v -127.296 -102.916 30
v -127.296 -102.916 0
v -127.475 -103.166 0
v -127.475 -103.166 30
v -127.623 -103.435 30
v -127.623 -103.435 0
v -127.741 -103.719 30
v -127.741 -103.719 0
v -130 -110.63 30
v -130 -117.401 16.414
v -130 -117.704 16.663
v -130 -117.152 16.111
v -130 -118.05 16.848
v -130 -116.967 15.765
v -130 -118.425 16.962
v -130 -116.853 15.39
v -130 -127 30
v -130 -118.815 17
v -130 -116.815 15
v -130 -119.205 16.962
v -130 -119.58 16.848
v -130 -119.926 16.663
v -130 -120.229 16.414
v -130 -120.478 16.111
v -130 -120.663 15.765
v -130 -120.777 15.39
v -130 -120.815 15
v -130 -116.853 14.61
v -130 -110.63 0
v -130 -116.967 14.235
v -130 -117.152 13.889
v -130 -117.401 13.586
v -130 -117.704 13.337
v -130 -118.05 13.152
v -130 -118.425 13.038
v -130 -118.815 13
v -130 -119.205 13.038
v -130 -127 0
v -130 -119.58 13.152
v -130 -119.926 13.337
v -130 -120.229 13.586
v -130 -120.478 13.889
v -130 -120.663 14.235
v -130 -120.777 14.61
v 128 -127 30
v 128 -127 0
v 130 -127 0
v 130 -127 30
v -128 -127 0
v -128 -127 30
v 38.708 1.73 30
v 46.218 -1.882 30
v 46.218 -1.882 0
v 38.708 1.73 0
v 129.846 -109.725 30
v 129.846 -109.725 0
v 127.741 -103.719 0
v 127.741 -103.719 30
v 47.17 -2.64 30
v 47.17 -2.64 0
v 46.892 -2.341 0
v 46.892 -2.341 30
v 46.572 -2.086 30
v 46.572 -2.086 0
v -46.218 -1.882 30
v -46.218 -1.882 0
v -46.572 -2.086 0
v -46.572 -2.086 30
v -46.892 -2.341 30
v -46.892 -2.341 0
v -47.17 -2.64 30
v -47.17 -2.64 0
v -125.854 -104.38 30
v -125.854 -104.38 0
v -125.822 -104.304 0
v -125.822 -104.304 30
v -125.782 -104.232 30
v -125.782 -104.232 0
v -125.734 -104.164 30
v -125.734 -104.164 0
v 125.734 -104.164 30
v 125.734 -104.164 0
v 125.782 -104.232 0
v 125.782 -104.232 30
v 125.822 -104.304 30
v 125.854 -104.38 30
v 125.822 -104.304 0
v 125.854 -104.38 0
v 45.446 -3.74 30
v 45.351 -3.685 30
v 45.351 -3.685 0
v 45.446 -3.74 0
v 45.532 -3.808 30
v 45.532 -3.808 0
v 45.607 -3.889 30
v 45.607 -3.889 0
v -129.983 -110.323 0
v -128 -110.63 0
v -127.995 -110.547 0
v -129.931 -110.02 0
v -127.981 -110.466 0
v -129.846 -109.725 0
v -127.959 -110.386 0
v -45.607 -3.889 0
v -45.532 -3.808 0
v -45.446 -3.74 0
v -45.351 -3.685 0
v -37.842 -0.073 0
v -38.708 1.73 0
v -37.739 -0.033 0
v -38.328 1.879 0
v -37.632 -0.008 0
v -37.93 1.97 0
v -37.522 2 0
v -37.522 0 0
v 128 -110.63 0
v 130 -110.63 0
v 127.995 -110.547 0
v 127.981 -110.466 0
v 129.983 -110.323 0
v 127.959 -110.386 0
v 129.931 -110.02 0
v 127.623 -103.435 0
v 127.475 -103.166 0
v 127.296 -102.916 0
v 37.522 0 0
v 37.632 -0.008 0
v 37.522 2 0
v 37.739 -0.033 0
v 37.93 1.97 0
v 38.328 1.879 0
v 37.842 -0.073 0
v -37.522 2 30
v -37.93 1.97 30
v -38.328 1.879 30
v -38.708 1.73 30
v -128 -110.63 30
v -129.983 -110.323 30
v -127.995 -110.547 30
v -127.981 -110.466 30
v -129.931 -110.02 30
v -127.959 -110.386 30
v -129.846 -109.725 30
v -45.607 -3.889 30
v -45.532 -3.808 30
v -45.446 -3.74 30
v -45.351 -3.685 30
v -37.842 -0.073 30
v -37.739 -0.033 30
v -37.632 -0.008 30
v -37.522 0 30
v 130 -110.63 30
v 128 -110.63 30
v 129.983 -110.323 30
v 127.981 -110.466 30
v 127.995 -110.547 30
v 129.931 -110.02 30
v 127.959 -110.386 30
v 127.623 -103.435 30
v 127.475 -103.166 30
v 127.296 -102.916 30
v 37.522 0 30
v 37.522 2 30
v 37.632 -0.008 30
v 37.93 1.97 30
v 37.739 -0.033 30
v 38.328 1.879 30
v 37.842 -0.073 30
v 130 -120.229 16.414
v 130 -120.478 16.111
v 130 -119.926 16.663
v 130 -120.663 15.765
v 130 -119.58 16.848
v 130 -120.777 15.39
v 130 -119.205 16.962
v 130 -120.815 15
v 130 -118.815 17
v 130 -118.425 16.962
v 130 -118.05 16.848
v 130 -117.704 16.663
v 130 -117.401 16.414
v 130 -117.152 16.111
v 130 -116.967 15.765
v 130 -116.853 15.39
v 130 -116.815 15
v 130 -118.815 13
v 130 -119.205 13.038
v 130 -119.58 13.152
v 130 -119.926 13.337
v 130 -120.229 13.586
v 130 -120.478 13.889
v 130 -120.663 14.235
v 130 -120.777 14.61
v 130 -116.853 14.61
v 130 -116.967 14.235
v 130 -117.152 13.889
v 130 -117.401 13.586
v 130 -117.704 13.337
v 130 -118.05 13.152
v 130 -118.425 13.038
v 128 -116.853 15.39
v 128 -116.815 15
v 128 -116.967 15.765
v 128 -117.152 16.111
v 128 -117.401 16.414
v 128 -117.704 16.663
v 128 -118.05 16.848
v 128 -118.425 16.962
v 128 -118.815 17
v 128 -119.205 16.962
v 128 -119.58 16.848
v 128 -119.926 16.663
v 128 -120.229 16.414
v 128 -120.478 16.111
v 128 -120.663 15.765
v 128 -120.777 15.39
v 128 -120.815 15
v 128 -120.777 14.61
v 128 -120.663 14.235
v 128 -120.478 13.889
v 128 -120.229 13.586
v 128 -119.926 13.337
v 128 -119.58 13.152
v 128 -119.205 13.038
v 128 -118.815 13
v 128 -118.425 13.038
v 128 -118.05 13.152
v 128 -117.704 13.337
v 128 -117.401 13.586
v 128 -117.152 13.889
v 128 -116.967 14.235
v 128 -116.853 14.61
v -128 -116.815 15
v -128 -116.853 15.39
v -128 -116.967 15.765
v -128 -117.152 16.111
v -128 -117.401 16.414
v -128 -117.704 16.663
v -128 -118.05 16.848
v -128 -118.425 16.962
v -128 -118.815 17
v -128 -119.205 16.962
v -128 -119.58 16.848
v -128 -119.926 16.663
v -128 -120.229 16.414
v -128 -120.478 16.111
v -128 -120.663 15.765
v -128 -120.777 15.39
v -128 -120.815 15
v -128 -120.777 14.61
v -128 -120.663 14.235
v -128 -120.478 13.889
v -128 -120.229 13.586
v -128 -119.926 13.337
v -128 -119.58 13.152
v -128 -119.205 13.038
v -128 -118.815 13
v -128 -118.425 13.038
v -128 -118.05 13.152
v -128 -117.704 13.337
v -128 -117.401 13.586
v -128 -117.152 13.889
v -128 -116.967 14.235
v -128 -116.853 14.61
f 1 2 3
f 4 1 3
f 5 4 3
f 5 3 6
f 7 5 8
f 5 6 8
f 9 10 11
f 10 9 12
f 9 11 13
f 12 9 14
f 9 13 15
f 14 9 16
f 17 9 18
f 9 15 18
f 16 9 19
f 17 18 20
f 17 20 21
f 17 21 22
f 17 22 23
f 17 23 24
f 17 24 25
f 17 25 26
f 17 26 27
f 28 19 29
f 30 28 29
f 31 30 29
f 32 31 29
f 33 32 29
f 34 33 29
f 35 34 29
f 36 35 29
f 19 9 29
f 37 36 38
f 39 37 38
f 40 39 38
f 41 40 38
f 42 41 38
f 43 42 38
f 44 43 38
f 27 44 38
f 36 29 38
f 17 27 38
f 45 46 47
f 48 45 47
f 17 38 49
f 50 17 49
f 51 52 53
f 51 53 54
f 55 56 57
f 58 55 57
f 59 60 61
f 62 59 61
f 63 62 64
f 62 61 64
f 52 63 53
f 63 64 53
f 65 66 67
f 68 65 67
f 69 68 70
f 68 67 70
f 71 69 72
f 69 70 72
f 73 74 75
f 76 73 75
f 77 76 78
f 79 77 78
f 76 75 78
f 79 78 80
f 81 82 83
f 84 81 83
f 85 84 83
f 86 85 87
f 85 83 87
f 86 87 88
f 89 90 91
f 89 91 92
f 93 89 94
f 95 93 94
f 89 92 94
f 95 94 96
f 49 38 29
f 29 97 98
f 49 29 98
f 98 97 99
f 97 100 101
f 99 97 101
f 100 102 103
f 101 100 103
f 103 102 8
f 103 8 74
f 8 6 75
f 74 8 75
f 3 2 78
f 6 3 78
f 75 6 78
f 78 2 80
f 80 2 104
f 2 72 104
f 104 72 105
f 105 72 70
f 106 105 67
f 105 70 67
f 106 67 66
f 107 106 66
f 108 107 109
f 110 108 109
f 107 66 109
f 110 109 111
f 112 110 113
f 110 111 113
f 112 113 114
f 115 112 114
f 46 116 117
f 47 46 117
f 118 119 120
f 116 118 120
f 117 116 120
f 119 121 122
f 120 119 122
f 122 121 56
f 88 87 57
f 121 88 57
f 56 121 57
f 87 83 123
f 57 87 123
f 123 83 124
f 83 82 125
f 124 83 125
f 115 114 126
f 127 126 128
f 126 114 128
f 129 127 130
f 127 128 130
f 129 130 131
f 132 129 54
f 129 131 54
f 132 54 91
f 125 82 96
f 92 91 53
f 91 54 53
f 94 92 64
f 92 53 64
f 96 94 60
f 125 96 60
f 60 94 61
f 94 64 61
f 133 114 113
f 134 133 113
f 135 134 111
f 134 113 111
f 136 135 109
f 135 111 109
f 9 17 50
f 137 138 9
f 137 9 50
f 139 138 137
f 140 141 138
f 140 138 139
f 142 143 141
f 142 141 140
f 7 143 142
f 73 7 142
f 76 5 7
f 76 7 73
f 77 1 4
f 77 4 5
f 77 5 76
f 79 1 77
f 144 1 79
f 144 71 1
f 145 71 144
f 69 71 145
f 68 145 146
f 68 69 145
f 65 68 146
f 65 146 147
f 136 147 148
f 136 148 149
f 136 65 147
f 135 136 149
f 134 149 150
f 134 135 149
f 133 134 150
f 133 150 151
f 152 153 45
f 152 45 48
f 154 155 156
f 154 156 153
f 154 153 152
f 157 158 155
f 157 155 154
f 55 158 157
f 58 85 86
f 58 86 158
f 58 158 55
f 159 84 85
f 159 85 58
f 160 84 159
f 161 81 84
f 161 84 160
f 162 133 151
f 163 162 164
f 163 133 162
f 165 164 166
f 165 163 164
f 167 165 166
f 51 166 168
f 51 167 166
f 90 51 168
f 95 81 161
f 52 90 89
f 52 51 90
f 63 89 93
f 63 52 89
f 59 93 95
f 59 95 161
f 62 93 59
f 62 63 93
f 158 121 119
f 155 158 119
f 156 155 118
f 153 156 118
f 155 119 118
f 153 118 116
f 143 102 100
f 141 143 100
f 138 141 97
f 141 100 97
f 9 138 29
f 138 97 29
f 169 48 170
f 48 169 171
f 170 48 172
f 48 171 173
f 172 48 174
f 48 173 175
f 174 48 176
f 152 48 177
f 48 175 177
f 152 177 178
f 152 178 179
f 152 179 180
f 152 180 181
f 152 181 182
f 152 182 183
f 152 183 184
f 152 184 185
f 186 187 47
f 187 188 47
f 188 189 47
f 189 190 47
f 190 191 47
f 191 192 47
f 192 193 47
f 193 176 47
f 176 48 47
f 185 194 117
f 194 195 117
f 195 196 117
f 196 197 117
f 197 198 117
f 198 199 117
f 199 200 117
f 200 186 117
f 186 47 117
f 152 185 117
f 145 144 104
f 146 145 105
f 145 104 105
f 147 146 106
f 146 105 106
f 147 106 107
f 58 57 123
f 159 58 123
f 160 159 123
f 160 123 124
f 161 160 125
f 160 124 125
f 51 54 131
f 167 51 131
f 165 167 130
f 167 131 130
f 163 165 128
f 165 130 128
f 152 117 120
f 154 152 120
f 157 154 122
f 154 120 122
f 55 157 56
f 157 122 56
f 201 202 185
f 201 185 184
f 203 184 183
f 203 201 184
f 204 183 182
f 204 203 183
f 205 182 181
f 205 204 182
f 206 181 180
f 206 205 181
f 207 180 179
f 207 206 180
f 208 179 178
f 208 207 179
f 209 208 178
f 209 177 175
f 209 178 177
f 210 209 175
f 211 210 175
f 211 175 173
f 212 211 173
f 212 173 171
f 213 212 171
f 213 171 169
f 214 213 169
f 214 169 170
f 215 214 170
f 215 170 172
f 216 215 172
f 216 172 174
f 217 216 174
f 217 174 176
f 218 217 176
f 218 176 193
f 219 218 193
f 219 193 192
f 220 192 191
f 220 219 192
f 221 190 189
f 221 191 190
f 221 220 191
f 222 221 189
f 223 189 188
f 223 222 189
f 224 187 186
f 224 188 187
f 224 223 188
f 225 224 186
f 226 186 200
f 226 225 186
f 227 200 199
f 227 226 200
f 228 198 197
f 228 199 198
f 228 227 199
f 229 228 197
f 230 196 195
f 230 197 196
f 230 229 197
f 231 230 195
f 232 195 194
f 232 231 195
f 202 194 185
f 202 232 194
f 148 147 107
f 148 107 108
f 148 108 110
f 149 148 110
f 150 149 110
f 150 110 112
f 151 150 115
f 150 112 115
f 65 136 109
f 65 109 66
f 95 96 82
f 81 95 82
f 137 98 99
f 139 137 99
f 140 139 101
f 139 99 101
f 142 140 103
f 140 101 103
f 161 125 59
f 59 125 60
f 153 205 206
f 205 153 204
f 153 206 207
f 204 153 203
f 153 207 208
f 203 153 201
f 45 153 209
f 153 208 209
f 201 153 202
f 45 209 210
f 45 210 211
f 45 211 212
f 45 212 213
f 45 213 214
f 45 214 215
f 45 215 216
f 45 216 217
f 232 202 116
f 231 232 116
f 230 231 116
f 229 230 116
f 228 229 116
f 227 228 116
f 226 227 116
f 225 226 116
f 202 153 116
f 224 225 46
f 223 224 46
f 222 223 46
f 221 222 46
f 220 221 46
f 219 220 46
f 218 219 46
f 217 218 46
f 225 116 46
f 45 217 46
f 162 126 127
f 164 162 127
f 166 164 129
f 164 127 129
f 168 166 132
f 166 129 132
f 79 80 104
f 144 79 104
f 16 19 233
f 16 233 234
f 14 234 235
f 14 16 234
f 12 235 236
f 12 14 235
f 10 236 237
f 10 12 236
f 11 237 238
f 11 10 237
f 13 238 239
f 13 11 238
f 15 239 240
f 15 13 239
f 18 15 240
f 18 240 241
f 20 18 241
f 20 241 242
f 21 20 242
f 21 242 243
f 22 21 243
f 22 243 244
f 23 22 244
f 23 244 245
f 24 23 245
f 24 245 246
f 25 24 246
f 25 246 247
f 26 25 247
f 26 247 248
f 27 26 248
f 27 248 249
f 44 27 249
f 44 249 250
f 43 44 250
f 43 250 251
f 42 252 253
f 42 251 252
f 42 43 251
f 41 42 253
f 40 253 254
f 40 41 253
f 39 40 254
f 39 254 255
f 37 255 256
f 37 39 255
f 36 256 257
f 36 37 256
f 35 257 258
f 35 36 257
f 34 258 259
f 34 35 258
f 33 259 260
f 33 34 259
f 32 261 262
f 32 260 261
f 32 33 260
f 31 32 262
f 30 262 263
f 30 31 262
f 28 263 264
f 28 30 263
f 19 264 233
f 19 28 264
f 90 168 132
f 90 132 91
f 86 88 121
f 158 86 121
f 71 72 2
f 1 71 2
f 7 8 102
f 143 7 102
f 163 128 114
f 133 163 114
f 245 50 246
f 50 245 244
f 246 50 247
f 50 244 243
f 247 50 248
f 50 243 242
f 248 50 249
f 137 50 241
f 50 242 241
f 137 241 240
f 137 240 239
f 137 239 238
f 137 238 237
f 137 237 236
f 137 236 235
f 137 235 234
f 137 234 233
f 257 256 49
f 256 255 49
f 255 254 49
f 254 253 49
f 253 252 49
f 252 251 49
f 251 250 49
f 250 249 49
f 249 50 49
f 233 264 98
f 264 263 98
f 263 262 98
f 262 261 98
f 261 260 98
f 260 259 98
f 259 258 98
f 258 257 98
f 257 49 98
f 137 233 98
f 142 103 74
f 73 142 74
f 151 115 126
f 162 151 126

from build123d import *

# Parameters (mm, degrees)
LOFTED_BENDS1_DEPTH     = 30
CUT_EXTRUDE1_DEPTH      = 291.9106392
CUT_EXTRUDE1_DEPTH_BACK = 291.9106392
SKETCH9_R               = 2


# Read off the part's stored shape, not the designer's step: Lofted Bends1
with BuildPart() as part:
    # Lofted Bends1 outline → Lofted Bends1 (new body)
    with BuildSketch(Plane.XY):
        with BuildLine():
            Line((-130, -110.629947141), (-130, -127))
            Line((-130, -127), (-128, -127))
            Line((-128, -127), (-128, -110.629947141))
            ThreePointArc((-128, -110.629947141), (-127.989562576, -110.506385525), (-127.958546096, -110.386325578))
            Line((-127.958546096, -110.386325578), (-125.853702275, -104.380395942))
            ThreePointArc((-125.853702275, -104.380395942), (-125.802985728, -104.267240099), (-125.734006394, -104.164195136))
            Line((-125.734006394, -104.164195136), (-45.607324148, -3.888698057))
            ThreePointArc((-45.607324148, -3.888698057), (-45.490716401, -3.772288571), (-45.351149992, -3.684711448))
            Line((-45.351149992, -3.684711448), (-37.841582221, -0.072791023))
            ThreePointArc((-37.841582221, -0.072791023), (-37.686040501, -0.018428275), (-37.522306162, 0))
            Line((-37.522306162, 0), (37.522306162, 0))
            ThreePointArc((37.522306162, 0), (37.686040501, -0.018428275), (37.841582221, -0.072791023))
            Line((37.841582221, -0.072791023), (45.351149992, -3.684711448))
            ThreePointArc((45.351149992, -3.684711448), (45.490716401, -3.772288571), (45.607324148, -3.888698057))
            Line((45.607324148, -3.888698057), (125.734006394, -104.164195136))
            ThreePointArc((125.734006394, -104.164195136), (125.802985728, -104.267240099), (125.853702275, -104.380395942))
            Line((125.853702275, -104.380395942), (127.958546096, -110.386325578))
            ThreePointArc((127.958546096, -110.386325578), (127.989562576, -110.506385525), (128, -110.629947141))
            Line((128, -110.629947141), (128, -127))
            Line((128, -127), (130, -127))
            Line((130, -127), (130, -110.629947141))
            ThreePointArc((130, -110.629947141), (129.961223114, -110.170893762), (129.845991373, -109.724849709))
            Line((129.845991373, -109.724849709), (127.741147552, -103.718920072))
            ThreePointArc((127.741147552, -103.718920072), (127.55272656, -103.298525993), (127.296456068, -102.91569563))
            Line((127.296456068, -102.91569563), (47.169773822, -2.640198551))
            ThreePointArc((47.169773822, -2.640198551), (46.736555305, -2.207716608), (46.218041274, -1.88235202))
            Line((46.218041274, -1.88235202), (38.708473503, 1.729568405))
            ThreePointArc((38.708473503, 1.729568405), (38.13060835, 1.93153568), (37.522306162, 2))
            Line((37.522306162, 2), (-37.522306162, 2))
            ThreePointArc((-37.522306162, 2), (-38.13060835, 1.93153568), (-38.708473503, 1.729568405))
            Line((-38.708473503, 1.729568405), (-46.218041274, -1.88235202))
            ThreePointArc((-46.218041274, -1.88235202), (-46.736555305, -2.207716608), (-47.169773822, -2.640198551))
            Line((-47.169773822, -2.640198551), (-127.296456068, -102.91569563))
            ThreePointArc((-127.296456068, -102.91569563), (-127.55272656, -103.298525993), (-127.741147552, -103.718920072))
            Line((-127.741147552, -103.718920072), (-129.845991373, -109.724849709))
            ThreePointArc((-129.845991373, -109.724849709), (-129.961223114, -110.170893762), (-130, -110.629947141))
        make_face()
    extrude(amount=LOFTED_BENDS1_DEPTH)

    # Sketch9 → Cut-Extrude1 (cut, two sides: drawn at the far end of the back side and taken through both)
    with BuildSketch(Plane(origin=(130, 0, 0), x_dir=(0, 0, -1), z_dir=(1, 0, 0)).offset(-CUT_EXTRUDE1_DEPTH_BACK)):
        with Locations(Location((-15, -118.814973571, 0), (0, 0, 90))):
            Circle(SKETCH9_R)
    extrude(amount=CUT_EXTRUDE1_DEPTH + CUT_EXTRUDE1_DEPTH_BACK, mode=Mode.SUBTRACT)


solid = part.part
